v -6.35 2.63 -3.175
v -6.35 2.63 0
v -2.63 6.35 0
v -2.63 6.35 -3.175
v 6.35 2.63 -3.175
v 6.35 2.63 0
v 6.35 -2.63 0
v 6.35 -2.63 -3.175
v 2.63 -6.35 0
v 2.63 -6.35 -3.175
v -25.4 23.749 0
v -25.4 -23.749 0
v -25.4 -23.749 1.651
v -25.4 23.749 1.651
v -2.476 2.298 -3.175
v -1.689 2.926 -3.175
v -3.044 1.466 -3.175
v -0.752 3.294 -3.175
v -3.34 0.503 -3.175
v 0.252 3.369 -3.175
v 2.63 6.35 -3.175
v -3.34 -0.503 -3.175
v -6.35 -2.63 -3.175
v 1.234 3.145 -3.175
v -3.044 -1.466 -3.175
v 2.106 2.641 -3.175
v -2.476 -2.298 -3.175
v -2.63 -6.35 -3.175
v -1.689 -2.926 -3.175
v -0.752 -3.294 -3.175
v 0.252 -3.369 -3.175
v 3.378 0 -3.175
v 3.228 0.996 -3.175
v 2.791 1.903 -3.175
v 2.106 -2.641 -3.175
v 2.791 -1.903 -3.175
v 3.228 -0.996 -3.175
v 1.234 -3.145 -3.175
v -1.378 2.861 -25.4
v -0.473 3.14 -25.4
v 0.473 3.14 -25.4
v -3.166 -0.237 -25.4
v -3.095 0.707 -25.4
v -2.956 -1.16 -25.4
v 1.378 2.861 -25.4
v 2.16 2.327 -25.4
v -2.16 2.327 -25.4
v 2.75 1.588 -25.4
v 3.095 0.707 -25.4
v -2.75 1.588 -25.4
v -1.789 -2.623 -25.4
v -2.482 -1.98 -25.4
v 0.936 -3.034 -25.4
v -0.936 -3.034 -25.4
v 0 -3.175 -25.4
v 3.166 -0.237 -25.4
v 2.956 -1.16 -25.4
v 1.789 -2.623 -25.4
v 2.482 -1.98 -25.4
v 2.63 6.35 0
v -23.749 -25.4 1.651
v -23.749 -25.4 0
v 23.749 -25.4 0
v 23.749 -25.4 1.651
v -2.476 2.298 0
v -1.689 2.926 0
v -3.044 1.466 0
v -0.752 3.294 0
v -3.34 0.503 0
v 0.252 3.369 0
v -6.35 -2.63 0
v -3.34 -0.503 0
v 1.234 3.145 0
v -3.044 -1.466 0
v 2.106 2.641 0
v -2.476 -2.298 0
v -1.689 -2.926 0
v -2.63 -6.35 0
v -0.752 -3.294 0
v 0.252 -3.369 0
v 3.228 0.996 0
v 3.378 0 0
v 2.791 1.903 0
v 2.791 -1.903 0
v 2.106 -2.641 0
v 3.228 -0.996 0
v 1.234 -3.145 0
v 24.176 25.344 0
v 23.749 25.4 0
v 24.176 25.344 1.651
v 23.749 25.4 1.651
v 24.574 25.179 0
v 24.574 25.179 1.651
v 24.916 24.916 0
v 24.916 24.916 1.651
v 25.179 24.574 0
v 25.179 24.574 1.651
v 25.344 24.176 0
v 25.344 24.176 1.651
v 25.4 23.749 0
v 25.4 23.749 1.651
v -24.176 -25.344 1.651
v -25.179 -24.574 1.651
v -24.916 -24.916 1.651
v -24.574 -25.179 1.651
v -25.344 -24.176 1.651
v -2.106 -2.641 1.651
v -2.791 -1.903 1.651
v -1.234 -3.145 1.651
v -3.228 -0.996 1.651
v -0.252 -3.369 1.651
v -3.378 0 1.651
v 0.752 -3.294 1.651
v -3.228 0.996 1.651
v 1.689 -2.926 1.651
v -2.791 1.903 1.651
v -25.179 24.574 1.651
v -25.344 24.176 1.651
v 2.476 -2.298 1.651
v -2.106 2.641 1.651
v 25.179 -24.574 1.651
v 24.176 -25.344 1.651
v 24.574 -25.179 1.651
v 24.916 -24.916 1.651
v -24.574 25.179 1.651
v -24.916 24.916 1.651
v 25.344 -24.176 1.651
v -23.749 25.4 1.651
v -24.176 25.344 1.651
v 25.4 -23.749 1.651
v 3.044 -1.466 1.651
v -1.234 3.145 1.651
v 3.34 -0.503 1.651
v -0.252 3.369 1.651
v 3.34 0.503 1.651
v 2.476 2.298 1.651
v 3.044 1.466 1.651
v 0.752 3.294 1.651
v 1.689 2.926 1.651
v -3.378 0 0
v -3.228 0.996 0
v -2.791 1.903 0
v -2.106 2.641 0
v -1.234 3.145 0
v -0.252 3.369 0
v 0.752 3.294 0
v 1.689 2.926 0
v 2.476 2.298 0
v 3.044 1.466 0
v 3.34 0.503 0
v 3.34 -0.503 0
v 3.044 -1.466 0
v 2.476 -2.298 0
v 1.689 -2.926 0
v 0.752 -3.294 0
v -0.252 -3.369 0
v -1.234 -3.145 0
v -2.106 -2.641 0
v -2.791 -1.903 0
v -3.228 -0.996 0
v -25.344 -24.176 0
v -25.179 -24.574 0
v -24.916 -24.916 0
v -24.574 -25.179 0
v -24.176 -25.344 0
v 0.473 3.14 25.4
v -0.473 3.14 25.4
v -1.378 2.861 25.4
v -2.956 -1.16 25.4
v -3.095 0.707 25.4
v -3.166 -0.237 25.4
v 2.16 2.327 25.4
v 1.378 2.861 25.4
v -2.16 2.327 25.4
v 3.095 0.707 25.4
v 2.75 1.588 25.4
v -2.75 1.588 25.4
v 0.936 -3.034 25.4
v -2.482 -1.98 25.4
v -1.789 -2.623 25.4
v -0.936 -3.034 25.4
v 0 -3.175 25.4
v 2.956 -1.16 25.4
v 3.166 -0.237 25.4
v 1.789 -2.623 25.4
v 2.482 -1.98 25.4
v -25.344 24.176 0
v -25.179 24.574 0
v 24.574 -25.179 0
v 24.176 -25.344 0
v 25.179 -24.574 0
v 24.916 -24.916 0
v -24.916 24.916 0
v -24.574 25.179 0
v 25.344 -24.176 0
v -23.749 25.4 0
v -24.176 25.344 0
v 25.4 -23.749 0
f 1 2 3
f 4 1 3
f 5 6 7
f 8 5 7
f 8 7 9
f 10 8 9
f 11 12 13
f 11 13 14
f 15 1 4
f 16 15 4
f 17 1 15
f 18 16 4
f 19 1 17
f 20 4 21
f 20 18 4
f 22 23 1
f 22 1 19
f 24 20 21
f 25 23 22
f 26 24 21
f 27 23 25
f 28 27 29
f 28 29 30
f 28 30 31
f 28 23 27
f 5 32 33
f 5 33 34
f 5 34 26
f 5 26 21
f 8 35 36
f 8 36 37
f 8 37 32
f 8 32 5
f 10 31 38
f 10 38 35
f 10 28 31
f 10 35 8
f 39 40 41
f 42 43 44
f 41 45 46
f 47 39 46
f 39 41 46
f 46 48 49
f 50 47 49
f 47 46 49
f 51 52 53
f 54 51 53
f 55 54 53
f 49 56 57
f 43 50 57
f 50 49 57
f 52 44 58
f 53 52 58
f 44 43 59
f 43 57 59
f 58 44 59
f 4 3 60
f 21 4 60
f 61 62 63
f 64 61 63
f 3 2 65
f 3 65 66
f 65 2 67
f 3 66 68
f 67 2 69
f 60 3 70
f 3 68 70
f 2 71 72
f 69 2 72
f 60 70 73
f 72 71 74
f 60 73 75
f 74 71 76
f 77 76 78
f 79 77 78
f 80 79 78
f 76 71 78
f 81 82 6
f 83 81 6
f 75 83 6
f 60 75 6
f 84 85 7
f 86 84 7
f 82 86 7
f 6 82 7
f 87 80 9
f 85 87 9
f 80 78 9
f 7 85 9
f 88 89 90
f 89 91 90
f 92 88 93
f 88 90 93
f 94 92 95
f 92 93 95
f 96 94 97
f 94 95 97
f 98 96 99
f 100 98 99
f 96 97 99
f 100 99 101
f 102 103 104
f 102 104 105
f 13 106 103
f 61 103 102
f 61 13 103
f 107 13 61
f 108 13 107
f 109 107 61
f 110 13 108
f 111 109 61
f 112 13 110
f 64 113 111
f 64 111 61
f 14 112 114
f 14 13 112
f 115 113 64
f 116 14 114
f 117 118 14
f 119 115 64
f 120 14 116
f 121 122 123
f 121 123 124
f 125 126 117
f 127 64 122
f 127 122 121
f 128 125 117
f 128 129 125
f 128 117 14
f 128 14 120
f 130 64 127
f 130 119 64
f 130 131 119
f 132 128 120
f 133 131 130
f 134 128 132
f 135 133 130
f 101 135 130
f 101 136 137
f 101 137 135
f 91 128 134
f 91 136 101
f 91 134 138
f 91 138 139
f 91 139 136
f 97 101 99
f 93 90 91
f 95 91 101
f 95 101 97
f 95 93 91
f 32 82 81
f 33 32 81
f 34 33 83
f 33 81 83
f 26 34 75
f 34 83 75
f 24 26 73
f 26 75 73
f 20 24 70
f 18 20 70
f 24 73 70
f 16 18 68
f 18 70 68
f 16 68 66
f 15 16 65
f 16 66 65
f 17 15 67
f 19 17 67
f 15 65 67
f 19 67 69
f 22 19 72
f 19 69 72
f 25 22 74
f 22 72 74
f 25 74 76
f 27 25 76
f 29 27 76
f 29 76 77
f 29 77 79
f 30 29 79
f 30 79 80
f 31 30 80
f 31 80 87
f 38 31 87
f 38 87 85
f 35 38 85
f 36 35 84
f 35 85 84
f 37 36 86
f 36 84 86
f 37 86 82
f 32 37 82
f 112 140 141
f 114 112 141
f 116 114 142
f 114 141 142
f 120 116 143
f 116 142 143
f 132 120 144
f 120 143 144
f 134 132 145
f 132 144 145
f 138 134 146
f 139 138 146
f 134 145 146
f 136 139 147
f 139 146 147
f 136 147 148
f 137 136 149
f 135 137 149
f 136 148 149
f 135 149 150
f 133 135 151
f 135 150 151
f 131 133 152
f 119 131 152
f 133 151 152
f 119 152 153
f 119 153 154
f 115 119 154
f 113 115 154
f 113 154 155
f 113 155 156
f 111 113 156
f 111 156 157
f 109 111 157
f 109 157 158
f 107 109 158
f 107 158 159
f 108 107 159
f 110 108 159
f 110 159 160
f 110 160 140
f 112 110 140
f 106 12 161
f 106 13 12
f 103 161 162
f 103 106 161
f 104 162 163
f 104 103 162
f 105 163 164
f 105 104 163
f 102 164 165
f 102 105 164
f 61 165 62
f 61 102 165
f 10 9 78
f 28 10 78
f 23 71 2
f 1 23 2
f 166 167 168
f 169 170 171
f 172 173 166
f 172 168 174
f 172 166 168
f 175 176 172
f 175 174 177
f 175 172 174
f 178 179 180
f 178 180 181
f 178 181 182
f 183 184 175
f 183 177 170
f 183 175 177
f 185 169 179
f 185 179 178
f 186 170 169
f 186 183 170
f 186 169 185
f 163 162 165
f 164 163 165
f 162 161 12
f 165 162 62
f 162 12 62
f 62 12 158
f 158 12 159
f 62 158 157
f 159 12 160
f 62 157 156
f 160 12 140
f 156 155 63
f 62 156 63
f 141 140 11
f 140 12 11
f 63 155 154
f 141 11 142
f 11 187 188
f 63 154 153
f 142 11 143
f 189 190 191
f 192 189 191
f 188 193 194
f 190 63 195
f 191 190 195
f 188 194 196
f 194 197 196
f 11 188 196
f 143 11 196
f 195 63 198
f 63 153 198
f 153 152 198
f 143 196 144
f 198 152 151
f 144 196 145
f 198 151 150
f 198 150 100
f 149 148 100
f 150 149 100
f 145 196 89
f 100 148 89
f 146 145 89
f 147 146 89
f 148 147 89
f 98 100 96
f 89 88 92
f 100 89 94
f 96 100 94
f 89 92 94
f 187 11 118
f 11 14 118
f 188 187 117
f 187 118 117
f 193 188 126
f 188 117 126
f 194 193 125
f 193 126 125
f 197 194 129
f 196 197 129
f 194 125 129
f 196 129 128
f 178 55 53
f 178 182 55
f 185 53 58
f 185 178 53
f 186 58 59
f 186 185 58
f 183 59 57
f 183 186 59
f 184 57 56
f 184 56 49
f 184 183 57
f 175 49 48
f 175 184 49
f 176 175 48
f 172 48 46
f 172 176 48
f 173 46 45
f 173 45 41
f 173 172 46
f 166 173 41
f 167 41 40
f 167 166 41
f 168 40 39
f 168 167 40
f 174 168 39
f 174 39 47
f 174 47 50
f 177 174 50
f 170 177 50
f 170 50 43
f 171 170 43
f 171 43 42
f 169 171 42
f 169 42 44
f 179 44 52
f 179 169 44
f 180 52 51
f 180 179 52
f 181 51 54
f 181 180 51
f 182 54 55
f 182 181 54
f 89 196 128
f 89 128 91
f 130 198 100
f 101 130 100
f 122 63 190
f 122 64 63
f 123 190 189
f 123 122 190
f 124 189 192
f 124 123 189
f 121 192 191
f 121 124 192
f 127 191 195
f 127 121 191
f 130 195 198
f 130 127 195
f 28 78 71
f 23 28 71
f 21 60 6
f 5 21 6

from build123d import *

# Parameters (mm, degrees)
F0_W     = 50.8
F0_H     = 50.8
F1_DEPTH = 1.651
F3_D     = 6.7564
F3_DEPTH = 25.4
F3_TIP   = 2.0298273432
F5_DEPTH = 3.175
F6_W     = 3.175
F6_H     = 50.8
F8_R     = 1.651


with BuildPart() as f1:
    # F0 (on Top) → F1 (new body)
    with BuildSketch(Plane.XY):
        Rectangle(F0_W, F0_H)
    extrude(amount=F1_DEPTH)

    # F3
    with Locations(Plane.XY.offset(1.651)):
        with Locations((0, 0)):
            Hole(F3_D / 2, depth=F3_DEPTH)
            with Locations((0, 0, -(F3_DEPTH + F3_TIP / 2))):  # 118° drill point
                Cone(0, F3_D / 2, F3_TIP, mode=Mode.SUBTRACT)

    # F8
    f8_edges = [f1.edges().sort_by_distance(p)[0] for p in [
        (-25.4, -25.4, 0.8255),
        (25.4, 25.4, 0.8255),
        (-25.4, 25.4, 0.8255),
        (25.4, -25.4, 0.8255),
    ]]
    fillet(f8_edges, radius=F8_R)


with BuildPart() as f5:
    # F4 (on face) → F5 (new body)
    with BuildSketch(Plane(origin=(0, 0, 0), x_dir=(1, 0, 0), z_dir=(0, 0, -1))):
        with BuildLine():
            Line((3.3782, 0), (6.35, 0))
            Line((6.35, 0), (6.35, 2.6302561211))
            Line((6.35, 2.6302561211), (2.6302561211, 6.35))
            Line((2.6302561211, 6.35), (-2.6302561211, 6.35))
            Line((-2.6302561211, 6.35), (-6.35, 2.6302561211))
            Line((-6.35, 2.6302561211), (-6.35, 0))
            Line((-6.35, 0), (-3.3782, 0))
            ThreePointArc((-3.3782, 0), (0, 3.3782), (3.3782, 0))
        make_face()
        with BuildLine():
            Line((-2.6302561211, -6.35), (2.6302561211, -6.35))
            Line((2.6302561211, -6.35), (6.35, -2.6302561211))
            Line((6.35, -2.6302561211), (6.35, 0))
            Line((6.35, 0), (3.3782, 0))
            ThreePointArc((3.3782, 0), (0, -3.3782), (-3.3782, 0))
            Line((-3.3782, 0), (-6.35, 0))
            Line((-6.35, 0), (-6.35, -2.6302561211))
            Line((-6.35, -2.6302561211), (-2.6302561211, -6.35))
        make_face()
    extrude(amount=F5_DEPTH)


with BuildPart() as f7:
    # F6 (on Right) → F7 (revolve)
    with BuildSketch(Plane.YZ):
        with Locations((-1.5875, 0)):
            Rectangle(F6_W, F6_H)
    revolve(axis=Axis((0, 0, 0), (0, 0, 1)))


solid = Compound([f1.part, f5.part, f7.part])
